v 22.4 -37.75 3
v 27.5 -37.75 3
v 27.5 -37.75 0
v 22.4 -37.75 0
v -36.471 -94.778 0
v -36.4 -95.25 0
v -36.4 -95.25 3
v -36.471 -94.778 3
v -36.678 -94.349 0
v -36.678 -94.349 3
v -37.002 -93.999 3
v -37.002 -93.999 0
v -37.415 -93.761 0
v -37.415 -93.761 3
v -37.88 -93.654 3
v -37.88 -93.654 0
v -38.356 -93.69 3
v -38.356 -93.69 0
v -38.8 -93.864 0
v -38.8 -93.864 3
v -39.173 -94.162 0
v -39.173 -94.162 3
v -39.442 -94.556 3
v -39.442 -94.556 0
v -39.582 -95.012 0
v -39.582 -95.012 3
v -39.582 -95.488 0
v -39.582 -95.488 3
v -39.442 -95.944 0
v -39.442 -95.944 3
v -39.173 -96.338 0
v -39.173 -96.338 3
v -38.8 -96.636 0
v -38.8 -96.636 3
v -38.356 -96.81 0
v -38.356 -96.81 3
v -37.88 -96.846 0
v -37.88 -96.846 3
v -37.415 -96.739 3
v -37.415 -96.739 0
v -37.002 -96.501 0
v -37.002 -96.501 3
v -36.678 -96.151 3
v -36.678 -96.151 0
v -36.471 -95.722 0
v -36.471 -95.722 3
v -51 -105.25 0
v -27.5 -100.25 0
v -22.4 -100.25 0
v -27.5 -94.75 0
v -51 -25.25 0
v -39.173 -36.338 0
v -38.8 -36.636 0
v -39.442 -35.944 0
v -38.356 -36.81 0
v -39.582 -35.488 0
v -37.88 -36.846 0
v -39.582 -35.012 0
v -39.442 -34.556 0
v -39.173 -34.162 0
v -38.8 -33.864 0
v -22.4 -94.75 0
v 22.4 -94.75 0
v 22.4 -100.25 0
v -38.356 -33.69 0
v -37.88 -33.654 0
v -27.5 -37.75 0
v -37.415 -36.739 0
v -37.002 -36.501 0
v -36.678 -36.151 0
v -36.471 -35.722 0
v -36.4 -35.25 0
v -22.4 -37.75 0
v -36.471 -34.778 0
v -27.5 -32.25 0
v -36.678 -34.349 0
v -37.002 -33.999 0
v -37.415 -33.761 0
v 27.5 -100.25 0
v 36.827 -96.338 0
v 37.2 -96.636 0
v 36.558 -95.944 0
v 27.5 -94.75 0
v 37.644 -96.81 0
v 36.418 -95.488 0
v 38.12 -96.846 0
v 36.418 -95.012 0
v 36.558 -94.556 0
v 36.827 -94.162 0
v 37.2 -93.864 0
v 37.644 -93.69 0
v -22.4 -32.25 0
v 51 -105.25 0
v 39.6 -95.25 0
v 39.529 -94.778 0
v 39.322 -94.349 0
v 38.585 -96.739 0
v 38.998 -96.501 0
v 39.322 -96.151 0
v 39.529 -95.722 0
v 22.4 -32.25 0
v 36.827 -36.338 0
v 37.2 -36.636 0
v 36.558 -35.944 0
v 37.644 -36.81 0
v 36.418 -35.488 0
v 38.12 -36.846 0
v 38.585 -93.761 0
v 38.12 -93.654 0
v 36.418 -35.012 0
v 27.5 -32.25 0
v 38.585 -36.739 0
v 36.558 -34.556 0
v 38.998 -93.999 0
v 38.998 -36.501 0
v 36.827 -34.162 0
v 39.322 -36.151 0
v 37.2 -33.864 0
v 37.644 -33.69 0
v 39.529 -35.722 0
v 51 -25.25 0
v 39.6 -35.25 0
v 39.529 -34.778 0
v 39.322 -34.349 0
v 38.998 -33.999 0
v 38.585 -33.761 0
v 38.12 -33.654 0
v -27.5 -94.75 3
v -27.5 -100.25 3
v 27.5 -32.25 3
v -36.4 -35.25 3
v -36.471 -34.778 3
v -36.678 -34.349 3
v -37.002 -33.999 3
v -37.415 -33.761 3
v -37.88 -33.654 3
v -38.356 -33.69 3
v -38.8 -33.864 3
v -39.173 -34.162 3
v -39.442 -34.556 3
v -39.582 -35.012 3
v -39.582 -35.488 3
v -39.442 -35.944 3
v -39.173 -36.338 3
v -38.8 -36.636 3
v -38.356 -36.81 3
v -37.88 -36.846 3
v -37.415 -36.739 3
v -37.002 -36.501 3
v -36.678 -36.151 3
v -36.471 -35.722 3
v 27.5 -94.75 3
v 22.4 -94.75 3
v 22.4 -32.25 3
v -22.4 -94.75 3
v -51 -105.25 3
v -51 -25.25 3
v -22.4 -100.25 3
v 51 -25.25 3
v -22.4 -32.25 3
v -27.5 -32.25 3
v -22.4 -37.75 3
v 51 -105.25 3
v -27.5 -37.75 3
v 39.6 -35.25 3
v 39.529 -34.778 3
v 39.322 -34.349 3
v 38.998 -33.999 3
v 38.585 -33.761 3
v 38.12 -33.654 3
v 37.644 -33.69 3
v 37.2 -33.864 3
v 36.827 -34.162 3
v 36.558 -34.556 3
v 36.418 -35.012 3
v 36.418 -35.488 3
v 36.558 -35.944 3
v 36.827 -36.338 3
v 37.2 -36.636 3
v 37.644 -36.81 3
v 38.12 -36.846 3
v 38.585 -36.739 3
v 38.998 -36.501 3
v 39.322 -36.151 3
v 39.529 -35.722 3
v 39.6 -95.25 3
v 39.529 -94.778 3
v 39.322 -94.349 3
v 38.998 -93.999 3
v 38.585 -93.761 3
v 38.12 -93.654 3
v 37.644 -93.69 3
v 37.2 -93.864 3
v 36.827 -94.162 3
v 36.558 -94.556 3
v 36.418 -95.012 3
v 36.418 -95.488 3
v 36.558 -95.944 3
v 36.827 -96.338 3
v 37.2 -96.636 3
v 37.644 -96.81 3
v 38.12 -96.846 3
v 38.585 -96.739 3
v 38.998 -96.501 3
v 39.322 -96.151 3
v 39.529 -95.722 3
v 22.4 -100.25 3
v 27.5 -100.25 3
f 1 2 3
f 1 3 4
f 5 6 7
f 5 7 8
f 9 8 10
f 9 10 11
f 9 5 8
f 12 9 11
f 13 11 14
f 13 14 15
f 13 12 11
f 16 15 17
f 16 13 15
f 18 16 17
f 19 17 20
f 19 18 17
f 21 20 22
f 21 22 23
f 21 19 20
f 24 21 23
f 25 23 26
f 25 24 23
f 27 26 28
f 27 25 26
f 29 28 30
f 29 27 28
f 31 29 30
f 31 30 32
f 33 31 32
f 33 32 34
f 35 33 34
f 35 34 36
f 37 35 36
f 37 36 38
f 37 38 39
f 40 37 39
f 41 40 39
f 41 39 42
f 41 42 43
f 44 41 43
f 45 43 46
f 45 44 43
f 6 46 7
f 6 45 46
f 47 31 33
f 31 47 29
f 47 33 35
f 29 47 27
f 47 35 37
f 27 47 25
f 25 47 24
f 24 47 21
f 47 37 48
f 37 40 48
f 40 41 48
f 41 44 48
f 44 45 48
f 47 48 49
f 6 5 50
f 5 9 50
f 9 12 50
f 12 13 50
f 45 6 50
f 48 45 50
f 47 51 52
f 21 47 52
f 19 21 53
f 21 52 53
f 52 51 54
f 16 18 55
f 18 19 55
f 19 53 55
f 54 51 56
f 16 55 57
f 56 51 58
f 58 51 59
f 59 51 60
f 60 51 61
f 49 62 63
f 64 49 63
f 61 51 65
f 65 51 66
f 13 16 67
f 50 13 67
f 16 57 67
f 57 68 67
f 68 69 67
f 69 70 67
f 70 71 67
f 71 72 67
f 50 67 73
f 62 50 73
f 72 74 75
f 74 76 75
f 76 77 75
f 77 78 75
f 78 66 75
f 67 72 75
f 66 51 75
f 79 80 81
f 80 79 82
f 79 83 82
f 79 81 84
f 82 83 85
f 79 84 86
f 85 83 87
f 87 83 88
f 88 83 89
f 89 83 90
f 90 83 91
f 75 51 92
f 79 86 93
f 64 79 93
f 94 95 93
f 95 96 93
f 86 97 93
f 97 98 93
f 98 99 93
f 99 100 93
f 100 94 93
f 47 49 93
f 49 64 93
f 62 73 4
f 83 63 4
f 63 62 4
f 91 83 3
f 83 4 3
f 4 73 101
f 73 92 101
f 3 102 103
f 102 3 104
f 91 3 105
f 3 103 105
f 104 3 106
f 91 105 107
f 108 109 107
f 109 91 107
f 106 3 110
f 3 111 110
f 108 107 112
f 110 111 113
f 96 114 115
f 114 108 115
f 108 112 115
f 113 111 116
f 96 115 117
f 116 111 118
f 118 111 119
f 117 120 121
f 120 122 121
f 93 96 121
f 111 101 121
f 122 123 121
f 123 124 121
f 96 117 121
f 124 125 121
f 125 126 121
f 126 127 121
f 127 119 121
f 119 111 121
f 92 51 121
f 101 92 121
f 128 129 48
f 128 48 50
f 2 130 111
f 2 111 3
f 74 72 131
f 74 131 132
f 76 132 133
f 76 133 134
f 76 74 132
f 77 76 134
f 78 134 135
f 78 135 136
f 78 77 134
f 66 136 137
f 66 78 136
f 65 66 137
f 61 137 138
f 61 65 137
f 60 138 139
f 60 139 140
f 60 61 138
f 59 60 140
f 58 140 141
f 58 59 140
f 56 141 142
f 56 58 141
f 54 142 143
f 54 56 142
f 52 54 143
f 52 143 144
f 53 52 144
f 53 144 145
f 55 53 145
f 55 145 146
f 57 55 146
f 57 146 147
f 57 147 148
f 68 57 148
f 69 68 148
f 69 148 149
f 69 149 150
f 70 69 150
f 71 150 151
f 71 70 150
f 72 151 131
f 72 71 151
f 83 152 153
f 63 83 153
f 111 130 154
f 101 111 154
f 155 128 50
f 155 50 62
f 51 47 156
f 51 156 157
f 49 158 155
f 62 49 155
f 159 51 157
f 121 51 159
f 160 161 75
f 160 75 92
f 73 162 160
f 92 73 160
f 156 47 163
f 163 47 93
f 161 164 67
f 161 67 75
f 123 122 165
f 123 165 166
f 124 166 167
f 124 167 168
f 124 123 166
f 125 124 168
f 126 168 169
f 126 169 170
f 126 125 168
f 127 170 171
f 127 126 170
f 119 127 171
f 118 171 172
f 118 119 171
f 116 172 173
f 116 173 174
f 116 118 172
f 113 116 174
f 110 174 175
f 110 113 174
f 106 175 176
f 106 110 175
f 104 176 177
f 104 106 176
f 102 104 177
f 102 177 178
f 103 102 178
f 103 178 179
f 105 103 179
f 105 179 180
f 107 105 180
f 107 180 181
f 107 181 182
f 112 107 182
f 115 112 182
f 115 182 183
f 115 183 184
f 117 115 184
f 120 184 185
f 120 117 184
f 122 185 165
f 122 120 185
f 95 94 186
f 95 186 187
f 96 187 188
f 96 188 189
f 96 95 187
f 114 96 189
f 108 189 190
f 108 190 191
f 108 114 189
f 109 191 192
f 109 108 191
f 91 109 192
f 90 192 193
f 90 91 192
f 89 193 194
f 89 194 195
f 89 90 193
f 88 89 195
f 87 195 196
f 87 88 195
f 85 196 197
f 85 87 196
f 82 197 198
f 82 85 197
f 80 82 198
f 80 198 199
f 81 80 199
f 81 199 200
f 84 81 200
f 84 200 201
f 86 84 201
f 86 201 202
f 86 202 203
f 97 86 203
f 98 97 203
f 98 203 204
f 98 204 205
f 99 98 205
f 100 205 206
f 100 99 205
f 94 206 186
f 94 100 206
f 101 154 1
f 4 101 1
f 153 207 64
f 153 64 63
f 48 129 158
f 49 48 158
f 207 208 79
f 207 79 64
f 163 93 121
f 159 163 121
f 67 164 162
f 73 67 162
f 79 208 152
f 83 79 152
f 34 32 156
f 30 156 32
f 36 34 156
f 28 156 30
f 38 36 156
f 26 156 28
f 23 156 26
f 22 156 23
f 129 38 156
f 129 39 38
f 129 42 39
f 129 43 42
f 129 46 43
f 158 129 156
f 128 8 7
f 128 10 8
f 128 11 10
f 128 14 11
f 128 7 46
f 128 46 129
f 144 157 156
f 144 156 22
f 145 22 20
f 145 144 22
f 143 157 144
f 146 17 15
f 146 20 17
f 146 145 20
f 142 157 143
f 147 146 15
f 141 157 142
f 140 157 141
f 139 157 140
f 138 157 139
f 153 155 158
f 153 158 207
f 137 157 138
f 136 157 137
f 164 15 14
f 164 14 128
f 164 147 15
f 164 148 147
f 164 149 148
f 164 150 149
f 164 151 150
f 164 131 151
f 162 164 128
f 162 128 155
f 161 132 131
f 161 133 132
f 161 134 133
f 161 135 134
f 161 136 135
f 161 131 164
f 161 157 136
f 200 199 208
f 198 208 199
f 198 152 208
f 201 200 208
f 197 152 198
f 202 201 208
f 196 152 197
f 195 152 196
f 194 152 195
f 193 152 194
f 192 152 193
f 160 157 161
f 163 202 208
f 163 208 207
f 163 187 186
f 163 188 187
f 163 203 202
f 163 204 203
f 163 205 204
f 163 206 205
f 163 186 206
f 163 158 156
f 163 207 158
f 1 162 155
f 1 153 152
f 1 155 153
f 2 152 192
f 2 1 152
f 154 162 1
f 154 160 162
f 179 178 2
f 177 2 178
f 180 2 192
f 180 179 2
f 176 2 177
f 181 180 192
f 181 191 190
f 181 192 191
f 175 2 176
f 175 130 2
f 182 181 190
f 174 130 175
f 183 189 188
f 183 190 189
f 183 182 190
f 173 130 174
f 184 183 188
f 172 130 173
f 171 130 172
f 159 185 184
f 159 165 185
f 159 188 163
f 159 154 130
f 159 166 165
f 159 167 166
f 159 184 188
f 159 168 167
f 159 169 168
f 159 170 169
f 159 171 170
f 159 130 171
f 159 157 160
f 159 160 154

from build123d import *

# Parameters (mm, degrees)
SKETCH_1_W                       = 102
SKETCH_1_H                       = 80
SKETCH_1_R                       = 1.6
EXTRUDE_1_DEPTH                  = 3
SKETCH_4_W                       = 5.1
SKETCH_4_H                       = 5.5
CUT_EXTRUDE_2_DEPTH              = 5
PATTERN_LINEAR_1_COUNT           = 2
PATTERN_LINEAR_1_PITCH           = 62.5
PATTERN_LINEAR_1_COPY_1_SKETCH_W = 5.1
PATTERN_LINEAR_1_COPY_1_SKETCH_H = 5.5
PATTERN_LINEAR_1_COPY_1_DEPTH    = 5


with BuildPart() as part:
    # 草图1 → 凸台-拉伸1 (new body)
    with BuildSketch(Plane.XY):
        with Locations((0, -65.25)):
            Rectangle(SKETCH_1_W, SKETCH_1_H)
        with Locations((-38, -35.25)):
            Circle(SKETCH_1_R, mode=Mode.SUBTRACT)
        with Locations((-38, -95.25)):
            Circle(SKETCH_1_R, mode=Mode.SUBTRACT)
        with Locations((38, -95.25)):
            Circle(SKETCH_1_R, mode=Mode.SUBTRACT)
        with Locations((38, -35.25)):
            Circle(SKETCH_1_R, mode=Mode.SUBTRACT)
    extrude(amount=EXTRUDE_1_DEPTH)

    # 草图4 → 切除-拉伸2 (cut)
    with BuildSketch(Plane.XY.offset(3)):
        with Locations((-24.949999999, -97.5)):
            Rectangle(SKETCH_4_W, SKETCH_4_H)
    cut_extrude_2 = extrude(amount=-CUT_EXTRUDE_2_DEPTH, mode=Mode.SUBTRACT)

    # 镜向1: 切除-拉伸2 across plane
    add(cut_extrude_2.mirror(Plane.ZY), mode=Mode.SUBTRACT)

    # 阵列(线性)1: 切除-拉伸2 ×2
    with Locations(*[(0, i * PATTERN_LINEAR_1_PITCH, 0) for i in range(1, PATTERN_LINEAR_1_COUNT)]):
        add(cut_extrude_2, mode=Mode.SUBTRACT)

    # 阵列(线性)1 copy 1 sketch → 阵列(线性)1 copy 1 (cut)
    with BuildSketch(Plane(origin=(0, 62.5, 3), x_dir=(-1, 0, 0), z_dir=(0, 0, 1))):
        with Locations((-24.949999999, 97.5)):
            Rectangle(PATTERN_LINEAR_1_COPY_1_SKETCH_W, PATTERN_LINEAR_1_COPY_1_SKETCH_H)
    extrude(amount=-PATTERN_LINEAR_1_COPY_1_DEPTH, mode=Mode.SUBTRACT)


solid = part.part
